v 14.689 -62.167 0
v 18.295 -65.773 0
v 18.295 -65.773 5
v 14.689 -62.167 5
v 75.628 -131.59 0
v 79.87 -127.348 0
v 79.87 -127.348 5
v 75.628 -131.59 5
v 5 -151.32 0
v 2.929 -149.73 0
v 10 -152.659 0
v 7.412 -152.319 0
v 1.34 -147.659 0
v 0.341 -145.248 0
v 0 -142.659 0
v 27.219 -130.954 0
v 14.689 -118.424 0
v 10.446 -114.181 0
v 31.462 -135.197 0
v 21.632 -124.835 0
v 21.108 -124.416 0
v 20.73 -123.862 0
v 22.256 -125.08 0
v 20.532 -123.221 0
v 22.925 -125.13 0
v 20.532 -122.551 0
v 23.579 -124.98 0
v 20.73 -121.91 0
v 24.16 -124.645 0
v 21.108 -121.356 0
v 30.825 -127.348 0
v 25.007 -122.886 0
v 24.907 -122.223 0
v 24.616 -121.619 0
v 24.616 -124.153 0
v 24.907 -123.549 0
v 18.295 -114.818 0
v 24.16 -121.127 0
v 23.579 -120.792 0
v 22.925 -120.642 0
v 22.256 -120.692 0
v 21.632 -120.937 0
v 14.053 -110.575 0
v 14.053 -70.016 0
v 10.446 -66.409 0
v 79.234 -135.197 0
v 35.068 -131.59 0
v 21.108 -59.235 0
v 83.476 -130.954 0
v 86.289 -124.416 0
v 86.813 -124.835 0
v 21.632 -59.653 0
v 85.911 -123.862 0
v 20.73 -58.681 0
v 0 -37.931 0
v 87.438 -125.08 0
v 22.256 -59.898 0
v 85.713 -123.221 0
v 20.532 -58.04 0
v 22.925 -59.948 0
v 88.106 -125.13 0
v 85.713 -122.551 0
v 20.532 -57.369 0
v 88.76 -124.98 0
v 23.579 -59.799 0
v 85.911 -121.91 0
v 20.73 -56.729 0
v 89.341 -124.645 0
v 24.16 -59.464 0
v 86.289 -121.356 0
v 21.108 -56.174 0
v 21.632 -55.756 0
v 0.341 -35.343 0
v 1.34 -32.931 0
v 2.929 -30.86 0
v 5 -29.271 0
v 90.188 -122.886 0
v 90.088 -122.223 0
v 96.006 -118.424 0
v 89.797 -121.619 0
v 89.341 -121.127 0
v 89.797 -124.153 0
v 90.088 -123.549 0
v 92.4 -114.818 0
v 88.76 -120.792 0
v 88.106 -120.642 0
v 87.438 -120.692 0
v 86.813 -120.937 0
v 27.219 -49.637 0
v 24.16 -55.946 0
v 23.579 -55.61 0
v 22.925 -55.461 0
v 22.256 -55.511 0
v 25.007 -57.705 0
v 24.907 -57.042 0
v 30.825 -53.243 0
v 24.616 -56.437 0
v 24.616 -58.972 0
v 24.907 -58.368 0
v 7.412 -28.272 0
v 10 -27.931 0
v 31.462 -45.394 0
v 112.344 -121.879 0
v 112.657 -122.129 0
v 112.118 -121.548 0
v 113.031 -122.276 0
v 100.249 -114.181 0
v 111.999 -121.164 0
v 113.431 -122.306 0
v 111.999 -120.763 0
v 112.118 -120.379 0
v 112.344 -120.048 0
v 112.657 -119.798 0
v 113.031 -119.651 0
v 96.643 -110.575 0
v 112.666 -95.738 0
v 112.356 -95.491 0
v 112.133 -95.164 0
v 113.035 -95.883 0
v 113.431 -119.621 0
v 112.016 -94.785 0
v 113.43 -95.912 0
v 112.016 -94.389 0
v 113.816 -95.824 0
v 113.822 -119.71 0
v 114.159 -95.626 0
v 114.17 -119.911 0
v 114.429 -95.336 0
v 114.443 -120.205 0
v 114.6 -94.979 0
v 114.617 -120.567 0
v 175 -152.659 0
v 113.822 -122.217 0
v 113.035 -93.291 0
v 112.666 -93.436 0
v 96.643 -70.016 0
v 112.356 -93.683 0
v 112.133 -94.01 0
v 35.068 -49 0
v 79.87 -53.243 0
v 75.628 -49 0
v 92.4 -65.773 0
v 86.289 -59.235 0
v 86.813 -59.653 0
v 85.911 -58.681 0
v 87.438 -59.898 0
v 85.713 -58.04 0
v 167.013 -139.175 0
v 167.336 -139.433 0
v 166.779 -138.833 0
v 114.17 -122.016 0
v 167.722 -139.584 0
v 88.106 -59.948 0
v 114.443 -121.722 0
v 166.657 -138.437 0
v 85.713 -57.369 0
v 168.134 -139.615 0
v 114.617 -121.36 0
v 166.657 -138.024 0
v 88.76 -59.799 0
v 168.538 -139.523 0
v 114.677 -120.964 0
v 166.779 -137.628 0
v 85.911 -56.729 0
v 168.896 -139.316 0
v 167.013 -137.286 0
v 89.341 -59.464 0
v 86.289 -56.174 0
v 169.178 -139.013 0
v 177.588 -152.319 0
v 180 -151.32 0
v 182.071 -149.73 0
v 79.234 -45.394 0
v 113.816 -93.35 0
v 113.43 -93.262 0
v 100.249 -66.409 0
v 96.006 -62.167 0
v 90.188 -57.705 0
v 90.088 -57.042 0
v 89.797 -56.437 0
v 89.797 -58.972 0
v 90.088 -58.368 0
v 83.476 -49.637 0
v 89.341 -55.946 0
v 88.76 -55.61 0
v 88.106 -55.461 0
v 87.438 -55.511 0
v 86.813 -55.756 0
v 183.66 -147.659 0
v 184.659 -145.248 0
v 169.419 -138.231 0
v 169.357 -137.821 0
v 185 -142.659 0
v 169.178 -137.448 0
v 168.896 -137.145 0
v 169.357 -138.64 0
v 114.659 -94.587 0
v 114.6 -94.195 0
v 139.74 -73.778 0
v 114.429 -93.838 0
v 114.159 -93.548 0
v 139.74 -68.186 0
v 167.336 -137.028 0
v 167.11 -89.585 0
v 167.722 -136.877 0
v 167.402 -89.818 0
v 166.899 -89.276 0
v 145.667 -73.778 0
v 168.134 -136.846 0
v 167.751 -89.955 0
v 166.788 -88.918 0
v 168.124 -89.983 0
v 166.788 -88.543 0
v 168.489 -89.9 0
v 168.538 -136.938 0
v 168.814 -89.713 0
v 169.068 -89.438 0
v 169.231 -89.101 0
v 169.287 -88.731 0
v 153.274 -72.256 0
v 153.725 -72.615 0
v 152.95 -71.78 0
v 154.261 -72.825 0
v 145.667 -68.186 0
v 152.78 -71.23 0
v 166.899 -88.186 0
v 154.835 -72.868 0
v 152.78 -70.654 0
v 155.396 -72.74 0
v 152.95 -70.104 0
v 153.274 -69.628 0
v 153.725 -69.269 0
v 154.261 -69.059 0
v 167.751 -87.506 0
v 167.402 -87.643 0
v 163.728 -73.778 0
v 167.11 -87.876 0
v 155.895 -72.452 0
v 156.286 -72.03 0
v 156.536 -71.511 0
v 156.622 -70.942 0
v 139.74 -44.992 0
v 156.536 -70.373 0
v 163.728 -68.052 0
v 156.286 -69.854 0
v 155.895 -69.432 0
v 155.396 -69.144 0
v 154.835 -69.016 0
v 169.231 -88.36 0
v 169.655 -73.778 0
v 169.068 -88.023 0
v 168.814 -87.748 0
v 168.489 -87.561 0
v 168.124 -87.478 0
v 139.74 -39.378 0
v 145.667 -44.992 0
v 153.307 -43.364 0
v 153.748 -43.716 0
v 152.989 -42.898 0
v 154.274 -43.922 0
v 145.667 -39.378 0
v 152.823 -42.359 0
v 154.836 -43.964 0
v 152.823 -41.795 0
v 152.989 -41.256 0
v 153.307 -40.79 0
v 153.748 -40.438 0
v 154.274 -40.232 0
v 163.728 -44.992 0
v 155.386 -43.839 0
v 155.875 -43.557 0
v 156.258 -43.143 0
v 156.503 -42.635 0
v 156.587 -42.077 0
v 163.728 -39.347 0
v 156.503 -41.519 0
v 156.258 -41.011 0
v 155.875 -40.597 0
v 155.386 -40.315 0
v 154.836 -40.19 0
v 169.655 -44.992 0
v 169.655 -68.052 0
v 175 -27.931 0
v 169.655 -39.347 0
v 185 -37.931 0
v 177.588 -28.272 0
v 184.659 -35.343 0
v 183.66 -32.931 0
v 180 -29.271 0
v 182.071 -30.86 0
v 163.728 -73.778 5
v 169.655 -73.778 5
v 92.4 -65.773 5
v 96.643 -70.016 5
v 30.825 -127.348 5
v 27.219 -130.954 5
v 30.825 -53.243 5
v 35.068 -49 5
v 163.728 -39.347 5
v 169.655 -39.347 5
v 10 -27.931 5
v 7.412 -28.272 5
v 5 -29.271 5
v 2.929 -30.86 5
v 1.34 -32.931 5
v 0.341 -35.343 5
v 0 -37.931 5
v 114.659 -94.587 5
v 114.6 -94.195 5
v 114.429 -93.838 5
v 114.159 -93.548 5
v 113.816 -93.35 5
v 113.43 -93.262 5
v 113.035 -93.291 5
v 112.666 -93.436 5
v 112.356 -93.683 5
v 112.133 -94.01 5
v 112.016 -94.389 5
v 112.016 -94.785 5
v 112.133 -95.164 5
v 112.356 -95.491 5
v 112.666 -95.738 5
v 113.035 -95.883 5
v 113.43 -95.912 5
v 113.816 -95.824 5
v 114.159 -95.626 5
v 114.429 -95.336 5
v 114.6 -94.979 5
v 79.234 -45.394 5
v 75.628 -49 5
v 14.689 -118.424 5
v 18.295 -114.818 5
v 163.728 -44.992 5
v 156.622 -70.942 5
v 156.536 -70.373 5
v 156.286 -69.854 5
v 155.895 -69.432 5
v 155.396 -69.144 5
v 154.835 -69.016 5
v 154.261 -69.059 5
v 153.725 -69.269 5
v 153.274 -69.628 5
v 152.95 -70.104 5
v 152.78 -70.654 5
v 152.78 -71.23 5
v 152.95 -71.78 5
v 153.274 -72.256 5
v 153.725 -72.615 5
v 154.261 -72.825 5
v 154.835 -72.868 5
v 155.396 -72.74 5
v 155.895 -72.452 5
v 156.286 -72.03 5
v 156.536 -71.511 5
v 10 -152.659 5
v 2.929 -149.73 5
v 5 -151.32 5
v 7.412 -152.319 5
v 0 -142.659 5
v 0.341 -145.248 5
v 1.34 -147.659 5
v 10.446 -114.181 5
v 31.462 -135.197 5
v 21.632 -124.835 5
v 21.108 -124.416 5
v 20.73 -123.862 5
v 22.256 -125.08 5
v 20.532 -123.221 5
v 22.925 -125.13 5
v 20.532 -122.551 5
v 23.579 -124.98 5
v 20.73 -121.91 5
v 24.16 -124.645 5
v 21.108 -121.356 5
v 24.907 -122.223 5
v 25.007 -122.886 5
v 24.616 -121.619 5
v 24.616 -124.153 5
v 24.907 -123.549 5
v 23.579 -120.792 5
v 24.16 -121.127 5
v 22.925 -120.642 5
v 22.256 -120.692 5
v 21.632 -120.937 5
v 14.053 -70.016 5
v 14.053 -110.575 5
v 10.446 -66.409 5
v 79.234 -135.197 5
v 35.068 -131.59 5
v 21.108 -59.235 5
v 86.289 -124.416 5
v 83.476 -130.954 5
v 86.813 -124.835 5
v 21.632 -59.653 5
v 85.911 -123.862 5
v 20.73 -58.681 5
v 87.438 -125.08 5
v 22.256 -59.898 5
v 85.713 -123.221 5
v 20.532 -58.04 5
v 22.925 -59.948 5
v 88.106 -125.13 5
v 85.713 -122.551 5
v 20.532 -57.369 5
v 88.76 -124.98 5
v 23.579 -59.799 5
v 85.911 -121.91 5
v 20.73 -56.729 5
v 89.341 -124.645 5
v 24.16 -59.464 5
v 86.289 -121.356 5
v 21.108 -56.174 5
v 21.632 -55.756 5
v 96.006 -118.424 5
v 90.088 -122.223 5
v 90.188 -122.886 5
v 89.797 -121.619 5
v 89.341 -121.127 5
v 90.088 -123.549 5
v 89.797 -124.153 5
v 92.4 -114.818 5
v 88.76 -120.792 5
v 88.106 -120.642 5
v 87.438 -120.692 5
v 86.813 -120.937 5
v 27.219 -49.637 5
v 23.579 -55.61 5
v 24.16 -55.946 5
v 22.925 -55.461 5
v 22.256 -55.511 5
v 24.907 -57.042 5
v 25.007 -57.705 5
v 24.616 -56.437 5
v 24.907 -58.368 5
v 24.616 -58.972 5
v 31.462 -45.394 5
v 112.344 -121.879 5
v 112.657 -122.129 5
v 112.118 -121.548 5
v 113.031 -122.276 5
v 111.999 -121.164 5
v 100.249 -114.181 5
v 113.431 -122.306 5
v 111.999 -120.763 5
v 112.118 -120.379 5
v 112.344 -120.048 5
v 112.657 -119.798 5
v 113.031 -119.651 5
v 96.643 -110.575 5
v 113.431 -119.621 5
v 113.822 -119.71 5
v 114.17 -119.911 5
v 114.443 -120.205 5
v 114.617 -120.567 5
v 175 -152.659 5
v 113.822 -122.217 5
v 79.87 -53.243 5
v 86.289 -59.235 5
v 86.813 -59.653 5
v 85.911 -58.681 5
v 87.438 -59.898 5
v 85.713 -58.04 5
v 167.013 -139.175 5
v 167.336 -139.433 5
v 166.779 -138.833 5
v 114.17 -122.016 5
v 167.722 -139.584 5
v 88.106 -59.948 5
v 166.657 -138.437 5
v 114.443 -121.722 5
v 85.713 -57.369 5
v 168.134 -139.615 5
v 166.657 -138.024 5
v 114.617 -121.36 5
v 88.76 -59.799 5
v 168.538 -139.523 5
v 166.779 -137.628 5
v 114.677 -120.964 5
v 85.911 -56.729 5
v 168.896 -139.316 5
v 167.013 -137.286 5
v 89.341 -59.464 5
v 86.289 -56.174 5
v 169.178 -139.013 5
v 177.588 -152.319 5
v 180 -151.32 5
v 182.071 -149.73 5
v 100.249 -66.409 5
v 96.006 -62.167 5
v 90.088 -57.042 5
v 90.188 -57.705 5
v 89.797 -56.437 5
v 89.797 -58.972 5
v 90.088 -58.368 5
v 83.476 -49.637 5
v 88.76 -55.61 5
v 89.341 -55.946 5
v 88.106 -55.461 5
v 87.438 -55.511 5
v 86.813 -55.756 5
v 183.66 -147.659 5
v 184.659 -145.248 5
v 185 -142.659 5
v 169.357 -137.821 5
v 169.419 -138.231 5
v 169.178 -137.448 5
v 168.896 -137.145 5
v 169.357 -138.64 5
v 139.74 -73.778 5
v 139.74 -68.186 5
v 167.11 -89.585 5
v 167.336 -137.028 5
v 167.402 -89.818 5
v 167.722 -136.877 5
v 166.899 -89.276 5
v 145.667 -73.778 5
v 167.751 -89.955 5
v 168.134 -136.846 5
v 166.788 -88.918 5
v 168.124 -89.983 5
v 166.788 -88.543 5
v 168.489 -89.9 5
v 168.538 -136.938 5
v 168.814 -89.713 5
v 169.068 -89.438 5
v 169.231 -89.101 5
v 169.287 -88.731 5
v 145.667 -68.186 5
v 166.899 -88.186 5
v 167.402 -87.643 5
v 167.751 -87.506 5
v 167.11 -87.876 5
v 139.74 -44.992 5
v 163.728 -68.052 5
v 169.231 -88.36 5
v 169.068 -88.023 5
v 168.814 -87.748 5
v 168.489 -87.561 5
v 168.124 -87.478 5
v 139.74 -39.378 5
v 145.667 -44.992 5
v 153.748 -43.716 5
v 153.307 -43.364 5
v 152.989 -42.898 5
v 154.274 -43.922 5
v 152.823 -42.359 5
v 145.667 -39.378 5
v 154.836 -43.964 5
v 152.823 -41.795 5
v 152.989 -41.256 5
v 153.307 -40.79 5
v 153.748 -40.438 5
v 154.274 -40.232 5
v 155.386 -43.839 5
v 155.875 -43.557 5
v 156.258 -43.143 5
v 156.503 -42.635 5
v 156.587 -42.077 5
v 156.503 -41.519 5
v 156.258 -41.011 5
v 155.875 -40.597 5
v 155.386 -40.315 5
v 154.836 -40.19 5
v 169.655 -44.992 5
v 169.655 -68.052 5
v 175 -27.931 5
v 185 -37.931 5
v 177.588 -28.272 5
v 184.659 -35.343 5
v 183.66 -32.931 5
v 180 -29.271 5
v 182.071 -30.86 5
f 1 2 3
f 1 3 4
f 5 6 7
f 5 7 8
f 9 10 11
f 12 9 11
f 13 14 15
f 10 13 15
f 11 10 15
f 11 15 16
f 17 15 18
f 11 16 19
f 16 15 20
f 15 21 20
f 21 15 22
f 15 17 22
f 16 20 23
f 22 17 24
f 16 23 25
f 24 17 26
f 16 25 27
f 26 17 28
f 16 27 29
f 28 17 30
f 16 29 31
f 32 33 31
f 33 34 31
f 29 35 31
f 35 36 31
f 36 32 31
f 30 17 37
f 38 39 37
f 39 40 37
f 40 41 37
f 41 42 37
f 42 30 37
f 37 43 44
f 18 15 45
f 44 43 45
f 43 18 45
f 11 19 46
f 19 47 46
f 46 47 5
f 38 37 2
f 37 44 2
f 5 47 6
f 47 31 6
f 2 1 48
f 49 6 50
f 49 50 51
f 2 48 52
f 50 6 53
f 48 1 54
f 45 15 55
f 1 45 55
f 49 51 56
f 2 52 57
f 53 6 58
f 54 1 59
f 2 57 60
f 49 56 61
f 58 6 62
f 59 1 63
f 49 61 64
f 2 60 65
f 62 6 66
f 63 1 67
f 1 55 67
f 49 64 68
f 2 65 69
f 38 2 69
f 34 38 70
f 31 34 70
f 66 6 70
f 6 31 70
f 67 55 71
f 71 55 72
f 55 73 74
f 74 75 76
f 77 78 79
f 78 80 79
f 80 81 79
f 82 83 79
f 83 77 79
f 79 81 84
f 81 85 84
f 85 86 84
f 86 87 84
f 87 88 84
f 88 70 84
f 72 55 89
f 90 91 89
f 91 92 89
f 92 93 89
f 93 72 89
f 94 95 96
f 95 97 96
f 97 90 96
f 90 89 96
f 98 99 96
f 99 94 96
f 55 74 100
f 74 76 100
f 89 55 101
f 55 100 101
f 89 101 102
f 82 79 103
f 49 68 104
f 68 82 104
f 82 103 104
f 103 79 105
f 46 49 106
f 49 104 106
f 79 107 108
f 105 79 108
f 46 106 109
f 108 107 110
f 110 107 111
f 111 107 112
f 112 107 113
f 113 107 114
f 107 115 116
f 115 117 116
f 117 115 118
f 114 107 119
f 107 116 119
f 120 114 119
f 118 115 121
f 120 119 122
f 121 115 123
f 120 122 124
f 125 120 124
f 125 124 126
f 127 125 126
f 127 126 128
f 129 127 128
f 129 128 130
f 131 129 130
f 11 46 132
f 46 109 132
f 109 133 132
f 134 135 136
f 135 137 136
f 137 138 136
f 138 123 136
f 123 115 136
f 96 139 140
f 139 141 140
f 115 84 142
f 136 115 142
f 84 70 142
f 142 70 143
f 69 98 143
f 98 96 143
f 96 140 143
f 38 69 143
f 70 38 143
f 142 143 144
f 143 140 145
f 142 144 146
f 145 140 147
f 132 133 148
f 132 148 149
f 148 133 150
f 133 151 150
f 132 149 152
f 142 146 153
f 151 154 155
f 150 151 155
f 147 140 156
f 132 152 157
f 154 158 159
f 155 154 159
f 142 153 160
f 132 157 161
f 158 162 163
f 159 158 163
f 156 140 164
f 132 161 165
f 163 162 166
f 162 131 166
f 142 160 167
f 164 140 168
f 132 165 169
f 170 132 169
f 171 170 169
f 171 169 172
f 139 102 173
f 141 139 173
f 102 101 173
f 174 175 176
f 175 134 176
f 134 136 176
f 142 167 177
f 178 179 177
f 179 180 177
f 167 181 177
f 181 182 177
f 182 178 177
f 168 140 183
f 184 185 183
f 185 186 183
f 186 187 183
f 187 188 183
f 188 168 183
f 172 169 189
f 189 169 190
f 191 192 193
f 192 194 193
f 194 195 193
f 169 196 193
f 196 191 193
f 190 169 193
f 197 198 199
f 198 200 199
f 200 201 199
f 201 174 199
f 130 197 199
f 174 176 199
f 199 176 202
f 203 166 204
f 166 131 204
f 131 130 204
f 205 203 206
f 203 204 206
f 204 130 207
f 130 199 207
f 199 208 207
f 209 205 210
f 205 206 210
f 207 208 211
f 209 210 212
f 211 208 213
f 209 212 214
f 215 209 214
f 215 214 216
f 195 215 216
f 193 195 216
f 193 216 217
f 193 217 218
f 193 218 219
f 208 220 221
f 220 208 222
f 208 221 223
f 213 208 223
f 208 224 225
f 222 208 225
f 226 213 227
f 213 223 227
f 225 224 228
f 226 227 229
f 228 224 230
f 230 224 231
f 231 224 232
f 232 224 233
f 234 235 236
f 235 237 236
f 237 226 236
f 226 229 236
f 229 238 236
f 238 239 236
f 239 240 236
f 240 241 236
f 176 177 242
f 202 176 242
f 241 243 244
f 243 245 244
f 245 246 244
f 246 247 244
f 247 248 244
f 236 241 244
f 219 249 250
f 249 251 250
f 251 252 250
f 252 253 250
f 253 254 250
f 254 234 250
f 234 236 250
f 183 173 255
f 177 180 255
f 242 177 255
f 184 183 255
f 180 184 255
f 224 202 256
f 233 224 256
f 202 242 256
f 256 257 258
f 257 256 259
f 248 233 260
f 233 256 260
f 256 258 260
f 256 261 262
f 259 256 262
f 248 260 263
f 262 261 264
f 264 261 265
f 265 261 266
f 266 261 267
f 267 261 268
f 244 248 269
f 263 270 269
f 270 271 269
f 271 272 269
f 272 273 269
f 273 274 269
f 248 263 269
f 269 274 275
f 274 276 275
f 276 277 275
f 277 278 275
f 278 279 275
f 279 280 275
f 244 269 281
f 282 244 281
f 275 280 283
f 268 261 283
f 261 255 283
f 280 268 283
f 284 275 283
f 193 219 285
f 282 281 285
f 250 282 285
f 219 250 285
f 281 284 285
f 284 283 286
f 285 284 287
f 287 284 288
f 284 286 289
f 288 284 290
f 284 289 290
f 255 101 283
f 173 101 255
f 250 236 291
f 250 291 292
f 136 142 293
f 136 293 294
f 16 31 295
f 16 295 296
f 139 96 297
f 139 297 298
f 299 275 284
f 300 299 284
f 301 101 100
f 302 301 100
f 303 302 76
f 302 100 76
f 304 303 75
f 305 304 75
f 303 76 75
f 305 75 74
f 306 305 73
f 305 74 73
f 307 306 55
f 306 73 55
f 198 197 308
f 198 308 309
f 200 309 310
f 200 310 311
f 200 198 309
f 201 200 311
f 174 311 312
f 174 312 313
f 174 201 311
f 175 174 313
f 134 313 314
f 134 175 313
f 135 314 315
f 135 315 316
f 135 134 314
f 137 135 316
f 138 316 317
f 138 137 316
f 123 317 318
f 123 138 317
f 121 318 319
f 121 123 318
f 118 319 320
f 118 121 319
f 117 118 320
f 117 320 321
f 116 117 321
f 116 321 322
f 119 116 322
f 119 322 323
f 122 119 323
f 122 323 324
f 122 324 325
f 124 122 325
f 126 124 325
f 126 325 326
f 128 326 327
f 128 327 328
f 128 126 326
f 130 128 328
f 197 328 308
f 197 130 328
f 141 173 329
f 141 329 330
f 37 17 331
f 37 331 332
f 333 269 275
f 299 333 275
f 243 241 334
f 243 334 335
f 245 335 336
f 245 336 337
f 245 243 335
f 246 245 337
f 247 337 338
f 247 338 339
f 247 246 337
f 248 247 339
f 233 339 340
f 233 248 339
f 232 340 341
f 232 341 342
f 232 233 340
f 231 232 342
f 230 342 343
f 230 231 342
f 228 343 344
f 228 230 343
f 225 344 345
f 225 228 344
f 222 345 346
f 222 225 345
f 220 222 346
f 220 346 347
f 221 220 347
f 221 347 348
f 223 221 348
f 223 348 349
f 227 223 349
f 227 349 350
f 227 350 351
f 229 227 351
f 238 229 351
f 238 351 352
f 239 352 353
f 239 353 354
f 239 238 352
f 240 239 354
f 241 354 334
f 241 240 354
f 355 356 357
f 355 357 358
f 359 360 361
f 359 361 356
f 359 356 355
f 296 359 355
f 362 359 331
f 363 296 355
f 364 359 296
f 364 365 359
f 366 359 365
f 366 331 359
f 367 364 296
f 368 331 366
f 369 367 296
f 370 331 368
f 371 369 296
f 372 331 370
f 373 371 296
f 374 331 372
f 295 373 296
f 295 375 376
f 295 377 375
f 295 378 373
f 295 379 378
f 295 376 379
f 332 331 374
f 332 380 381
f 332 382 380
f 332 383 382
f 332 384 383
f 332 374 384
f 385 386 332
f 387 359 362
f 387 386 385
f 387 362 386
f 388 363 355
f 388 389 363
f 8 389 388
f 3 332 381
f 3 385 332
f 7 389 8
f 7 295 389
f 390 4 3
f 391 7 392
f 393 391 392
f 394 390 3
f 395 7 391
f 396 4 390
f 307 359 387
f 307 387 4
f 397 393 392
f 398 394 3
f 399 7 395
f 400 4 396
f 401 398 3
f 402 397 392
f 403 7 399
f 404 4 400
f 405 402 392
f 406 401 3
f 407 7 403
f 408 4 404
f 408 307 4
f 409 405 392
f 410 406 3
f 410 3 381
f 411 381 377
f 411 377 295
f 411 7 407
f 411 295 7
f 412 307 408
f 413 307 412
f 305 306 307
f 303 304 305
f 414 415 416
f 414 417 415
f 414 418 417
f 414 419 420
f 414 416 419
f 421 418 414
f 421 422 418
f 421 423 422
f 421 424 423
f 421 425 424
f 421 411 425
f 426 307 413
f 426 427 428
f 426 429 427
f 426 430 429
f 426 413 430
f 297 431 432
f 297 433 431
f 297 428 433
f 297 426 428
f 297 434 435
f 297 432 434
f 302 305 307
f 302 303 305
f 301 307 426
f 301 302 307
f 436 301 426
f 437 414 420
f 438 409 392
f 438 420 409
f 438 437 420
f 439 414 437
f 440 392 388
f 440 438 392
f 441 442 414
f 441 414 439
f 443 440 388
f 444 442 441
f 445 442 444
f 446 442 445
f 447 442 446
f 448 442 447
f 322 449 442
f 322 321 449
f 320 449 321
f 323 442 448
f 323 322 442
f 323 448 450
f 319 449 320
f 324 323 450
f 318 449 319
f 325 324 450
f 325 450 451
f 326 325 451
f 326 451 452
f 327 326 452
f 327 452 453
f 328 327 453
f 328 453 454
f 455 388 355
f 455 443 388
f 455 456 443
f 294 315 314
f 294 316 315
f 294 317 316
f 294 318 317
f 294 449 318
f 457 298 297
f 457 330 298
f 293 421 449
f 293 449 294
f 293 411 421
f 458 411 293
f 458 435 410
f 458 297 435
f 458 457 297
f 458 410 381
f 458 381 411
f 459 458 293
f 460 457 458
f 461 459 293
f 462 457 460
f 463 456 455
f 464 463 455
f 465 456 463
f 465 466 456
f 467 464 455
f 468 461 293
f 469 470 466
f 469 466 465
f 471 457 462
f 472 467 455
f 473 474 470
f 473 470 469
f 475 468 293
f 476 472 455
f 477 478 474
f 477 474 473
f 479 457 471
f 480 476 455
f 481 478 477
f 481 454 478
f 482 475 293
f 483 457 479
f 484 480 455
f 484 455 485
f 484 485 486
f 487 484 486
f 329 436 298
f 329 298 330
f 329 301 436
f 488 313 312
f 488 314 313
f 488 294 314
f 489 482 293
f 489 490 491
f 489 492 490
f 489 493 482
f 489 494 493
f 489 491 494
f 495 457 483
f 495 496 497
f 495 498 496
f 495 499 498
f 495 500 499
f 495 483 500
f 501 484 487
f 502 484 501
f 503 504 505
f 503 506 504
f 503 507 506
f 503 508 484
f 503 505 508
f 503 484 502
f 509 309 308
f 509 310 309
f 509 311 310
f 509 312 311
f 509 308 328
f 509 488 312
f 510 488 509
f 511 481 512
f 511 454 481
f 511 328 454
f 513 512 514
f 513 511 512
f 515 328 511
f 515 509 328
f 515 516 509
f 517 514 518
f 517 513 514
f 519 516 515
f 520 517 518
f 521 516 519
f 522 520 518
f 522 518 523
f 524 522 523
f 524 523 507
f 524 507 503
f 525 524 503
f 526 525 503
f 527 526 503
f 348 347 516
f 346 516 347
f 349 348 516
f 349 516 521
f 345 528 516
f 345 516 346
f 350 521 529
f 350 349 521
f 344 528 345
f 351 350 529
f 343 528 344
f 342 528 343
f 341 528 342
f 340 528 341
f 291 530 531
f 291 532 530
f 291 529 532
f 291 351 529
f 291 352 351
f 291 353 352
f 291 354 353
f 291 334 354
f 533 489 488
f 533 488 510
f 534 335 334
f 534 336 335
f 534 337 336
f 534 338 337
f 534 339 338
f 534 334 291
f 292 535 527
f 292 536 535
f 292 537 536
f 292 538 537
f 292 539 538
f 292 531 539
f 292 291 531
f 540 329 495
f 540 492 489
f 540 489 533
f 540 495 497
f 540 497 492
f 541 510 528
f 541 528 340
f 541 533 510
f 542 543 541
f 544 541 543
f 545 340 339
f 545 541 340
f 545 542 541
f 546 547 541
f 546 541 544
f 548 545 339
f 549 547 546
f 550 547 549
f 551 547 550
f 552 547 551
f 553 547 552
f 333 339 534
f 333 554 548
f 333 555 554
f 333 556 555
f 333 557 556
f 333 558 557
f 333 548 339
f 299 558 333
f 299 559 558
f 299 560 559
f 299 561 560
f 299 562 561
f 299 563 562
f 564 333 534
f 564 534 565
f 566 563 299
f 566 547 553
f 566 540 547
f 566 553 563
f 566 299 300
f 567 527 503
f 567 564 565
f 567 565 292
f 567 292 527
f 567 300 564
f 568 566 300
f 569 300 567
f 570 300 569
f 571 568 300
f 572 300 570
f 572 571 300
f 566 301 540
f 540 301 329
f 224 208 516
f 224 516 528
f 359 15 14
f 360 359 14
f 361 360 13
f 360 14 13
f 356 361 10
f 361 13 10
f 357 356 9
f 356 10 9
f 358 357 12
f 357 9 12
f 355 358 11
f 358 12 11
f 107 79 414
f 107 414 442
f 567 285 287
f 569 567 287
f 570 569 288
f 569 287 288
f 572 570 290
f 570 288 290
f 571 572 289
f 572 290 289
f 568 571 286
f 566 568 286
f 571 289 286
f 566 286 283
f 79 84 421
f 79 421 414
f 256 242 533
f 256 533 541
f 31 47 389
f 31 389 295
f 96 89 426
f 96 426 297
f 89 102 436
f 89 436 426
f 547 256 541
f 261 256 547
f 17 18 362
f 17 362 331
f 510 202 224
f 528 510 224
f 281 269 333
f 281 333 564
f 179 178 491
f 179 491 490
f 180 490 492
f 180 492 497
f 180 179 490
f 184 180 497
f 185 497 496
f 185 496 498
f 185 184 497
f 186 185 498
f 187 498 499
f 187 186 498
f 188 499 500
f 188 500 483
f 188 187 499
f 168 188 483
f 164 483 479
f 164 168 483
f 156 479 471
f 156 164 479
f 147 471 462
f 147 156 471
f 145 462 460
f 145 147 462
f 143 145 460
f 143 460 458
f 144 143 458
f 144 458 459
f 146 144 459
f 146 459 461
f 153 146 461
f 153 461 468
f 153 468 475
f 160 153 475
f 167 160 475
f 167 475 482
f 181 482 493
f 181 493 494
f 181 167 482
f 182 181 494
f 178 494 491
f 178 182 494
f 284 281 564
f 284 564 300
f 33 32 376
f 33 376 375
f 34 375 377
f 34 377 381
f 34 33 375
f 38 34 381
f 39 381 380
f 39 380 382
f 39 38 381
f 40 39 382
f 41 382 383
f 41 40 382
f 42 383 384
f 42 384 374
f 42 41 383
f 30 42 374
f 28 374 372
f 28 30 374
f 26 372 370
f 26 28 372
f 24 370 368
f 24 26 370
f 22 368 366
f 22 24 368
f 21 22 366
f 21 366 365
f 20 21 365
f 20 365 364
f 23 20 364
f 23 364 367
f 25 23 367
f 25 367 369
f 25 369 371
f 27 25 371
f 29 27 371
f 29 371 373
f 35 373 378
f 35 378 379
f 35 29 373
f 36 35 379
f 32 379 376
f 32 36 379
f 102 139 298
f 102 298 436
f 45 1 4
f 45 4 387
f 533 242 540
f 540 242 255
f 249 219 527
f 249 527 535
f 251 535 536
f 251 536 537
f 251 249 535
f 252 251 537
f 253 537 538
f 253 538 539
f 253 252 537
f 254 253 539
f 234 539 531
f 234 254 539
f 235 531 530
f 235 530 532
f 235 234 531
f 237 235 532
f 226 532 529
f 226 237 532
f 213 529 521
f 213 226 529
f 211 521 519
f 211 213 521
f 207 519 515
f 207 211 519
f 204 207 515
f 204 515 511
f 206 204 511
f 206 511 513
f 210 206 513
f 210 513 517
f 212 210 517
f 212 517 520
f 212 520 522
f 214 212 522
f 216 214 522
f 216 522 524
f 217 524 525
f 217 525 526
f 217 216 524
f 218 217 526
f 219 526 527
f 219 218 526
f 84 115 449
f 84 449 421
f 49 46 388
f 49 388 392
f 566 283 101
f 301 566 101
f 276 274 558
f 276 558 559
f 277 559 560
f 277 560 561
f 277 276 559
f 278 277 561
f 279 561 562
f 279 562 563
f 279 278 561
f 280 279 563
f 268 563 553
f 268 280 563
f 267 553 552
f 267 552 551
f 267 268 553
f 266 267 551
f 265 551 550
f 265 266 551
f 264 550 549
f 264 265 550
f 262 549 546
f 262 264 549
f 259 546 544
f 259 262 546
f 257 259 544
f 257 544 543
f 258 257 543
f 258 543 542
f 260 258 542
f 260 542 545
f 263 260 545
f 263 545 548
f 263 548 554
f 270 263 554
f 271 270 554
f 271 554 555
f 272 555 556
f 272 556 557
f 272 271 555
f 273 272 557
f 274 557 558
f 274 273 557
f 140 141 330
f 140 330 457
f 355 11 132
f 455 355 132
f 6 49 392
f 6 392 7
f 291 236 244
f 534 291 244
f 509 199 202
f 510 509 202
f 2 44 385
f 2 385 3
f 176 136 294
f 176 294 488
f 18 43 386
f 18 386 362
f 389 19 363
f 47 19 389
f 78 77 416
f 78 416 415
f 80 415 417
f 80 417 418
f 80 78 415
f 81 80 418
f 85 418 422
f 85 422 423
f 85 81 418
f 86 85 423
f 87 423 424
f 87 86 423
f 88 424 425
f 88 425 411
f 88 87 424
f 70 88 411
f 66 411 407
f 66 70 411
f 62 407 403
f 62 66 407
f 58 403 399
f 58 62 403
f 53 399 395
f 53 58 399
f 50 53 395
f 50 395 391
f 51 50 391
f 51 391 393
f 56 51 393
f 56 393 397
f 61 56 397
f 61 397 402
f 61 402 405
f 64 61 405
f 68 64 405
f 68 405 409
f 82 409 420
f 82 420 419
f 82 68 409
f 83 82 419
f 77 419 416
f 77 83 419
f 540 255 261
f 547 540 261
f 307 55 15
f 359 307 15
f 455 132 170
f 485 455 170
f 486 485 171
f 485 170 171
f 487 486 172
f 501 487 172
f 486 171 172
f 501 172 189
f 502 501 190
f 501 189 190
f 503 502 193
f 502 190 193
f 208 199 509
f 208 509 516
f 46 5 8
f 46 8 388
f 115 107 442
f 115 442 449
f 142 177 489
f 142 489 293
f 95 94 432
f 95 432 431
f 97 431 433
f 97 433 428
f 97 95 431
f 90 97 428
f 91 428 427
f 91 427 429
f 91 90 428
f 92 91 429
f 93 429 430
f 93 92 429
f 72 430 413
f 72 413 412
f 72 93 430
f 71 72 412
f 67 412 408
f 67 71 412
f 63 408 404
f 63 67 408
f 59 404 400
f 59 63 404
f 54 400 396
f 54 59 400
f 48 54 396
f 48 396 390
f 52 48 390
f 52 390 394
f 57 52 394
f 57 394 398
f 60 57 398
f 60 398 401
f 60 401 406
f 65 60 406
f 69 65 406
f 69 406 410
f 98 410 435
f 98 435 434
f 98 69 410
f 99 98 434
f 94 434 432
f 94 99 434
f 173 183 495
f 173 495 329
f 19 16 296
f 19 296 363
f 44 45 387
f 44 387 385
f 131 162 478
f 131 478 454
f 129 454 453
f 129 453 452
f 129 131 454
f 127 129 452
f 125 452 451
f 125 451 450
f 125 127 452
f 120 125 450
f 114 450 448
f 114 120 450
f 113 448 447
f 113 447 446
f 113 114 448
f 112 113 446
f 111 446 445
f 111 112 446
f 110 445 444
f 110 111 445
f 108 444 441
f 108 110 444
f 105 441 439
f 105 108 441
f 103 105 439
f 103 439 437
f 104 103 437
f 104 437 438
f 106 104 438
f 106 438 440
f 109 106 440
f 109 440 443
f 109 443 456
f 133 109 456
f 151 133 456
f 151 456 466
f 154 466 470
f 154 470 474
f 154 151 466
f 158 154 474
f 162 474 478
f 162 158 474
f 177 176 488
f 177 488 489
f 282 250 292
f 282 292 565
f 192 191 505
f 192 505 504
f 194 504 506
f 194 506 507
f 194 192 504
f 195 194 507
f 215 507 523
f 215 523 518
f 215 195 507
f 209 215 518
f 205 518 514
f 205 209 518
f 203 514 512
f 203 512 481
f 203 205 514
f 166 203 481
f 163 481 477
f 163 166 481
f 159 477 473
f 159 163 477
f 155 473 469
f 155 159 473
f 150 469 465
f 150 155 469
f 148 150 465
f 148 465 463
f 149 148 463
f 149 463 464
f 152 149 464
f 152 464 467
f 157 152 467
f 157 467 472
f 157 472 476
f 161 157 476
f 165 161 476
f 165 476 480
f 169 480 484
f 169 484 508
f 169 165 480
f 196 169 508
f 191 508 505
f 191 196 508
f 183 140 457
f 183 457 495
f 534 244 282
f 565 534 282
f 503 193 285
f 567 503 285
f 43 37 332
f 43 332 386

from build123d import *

# Parameters (mm, degrees)
SKETCH2_R           = 1.892615742
SKETCH2_R_2         = 1.931502603
SKETCH2_R_3         = 1.328987324
SKETCH2_R_4         = 1.256139718
SKETCH2_R_5         = 2.25
SKETCH2_R_6         = 1.346221639
SKETCH2_R_7         = 1.388588177
SKETCH2_W           = 5.927
SKETCH2_H           = 5.645543841
SKETCH2_H_2         = 5.614229543
SKETCH2_H_3         = 5.725940204
SKETCH2_H_4         = 5.592813932
BOSS_EXTRUDE3_DEPTH = 5


with BuildPart() as part:
    # Sketch2 → Boss-Extrude3 (new body)
    with BuildSketch(Plane.XY):
        with BuildLine():
            Line((185, -142.659400732), (185, -37.931368938))
            ThreePointArc((185, -37.931368938), (182.071067812, -30.860301126), (175, -27.931368938))
            Line((175, -27.931368938), (10, -27.931368938))
            ThreePointArc((10, -27.931368938), (2.928932188, -30.860301126), (0, -37.931368938))
            Line((0, -37.931368938), (0, -142.659400732))
            ThreePointArc((0, -142.659400732), (2.928932188, -149.730468544), (10, -152.659400732))
            Line((10, -152.659400732), (175, -152.659400732))
            ThreePointArc((175, -152.659400732), (182.071067812, -149.730468544), (185, -142.659400732))
        make_face()
        with Locations((154.694647781, -42.076845181)):
            Circle(SKETCH2_R, mode=Mode.SUBTRACT)
        with Locations((154.690357003, -70.942028449)):
            Circle(SKETCH2_R_2, mode=Mode.SUBTRACT)
        with Locations((113.33050486, -94.586932903)):
            Circle(SKETCH2_R_3, mode=Mode.SUBTRACT)
        with Locations((168.03050486, -88.730534378)):
            Circle(SKETCH2_R_4, mode=Mode.SUBTRACT)
        with Locations((22.757067444, -122.885983842)):
            Circle(SKETCH2_R_5, mode=Mode.SUBTRACT)
        with Locations((113.33050486, -120.963520008)):
            Circle(SKETCH2_R_6, mode=Mode.SUBTRACT)
        with Locations((168.03050486, -138.230534378)):
            Circle(SKETCH2_R_7, mode=Mode.SUBTRACT)
        with Locations((87.938265458, -122.885983842)):
            Circle(SKETCH2_R_5, mode=Mode.SUBTRACT)
        with Locations((87.938265458, -57.704785828)):
            Circle(SKETCH2_R_5, mode=Mode.SUBTRACT)
        with Locations((22.757067444, -57.704785828)):
            Circle(SKETCH2_R_5, mode=Mode.SUBTRACT)
        with Locations((166.691794259, -42.169597018)):
            Rectangle(SKETCH2_W, SKETCH2_H, mode=Mode.SUBTRACT)
        with Locations((142.703794259, -42.185254167)):
            Rectangle(SKETCH2_W, SKETCH2_H_2, mode=Mode.SUBTRACT)
        with Locations((166.691794259, -70.915398836)):
            Rectangle(SKETCH2_W, SKETCH2_H_3, mode=Mode.SUBTRACT)
        with Locations((142.703794259, -70.981961972)):
            Rectangle(SKETCH2_W, SKETCH2_H_4, mode=Mode.SUBTRACT)
        Polygon((10.446338383, -114.181499366), (14.68897907, -118.424140053), (18.295223654, -114.817895469), (14.052582967, -110.575254782), align=None, mode=Mode.SUBTRACT)
        Polygon((35.067796504, -131.590468319), (30.825155817, -127.347827632), (27.218911233, -130.954072216), (31.46155192, -135.196712903), align=None, mode=Mode.SUBTRACT)
        Polygon((96.642749934, -110.575254782), (92.400109247, -114.817895469), (96.006353831, -118.424140053), (100.248994518, -114.181499366), align=None, mode=Mode.SUBTRACT)
        Polygon((79.233780981, -135.196712903), (83.476421669, -130.954072216), (79.870177084, -127.347827632), (75.627536397, -131.590468319), align=None, mode=Mode.SUBTRACT)
        Polygon((75.627536397, -49.000301352), (79.870177084, -53.242942039), (83.476421669, -49.636697455), (79.233780981, -45.394056768), align=None, mode=Mode.SUBTRACT)
        Polygon((100.248994518, -66.409270305), (96.006353831, -62.166629618), (92.400109247, -65.772874202), (96.642749934, -70.015514889), align=None, mode=Mode.SUBTRACT)
        Polygon((31.46155192, -45.394056768), (27.218911233, -49.636697455), (30.825155817, -53.242942039), (35.067796504, -49.000301352), align=None, mode=Mode.SUBTRACT)
        Polygon((14.052582967, -70.015514889), (18.295223654, -65.772874202), (14.68897907, -62.166629618), (10.446338383, -66.409270305), align=None, mode=Mode.SUBTRACT)
    extrude(amount=BOSS_EXTRUDE3_DEPTH)


solid = part.part
